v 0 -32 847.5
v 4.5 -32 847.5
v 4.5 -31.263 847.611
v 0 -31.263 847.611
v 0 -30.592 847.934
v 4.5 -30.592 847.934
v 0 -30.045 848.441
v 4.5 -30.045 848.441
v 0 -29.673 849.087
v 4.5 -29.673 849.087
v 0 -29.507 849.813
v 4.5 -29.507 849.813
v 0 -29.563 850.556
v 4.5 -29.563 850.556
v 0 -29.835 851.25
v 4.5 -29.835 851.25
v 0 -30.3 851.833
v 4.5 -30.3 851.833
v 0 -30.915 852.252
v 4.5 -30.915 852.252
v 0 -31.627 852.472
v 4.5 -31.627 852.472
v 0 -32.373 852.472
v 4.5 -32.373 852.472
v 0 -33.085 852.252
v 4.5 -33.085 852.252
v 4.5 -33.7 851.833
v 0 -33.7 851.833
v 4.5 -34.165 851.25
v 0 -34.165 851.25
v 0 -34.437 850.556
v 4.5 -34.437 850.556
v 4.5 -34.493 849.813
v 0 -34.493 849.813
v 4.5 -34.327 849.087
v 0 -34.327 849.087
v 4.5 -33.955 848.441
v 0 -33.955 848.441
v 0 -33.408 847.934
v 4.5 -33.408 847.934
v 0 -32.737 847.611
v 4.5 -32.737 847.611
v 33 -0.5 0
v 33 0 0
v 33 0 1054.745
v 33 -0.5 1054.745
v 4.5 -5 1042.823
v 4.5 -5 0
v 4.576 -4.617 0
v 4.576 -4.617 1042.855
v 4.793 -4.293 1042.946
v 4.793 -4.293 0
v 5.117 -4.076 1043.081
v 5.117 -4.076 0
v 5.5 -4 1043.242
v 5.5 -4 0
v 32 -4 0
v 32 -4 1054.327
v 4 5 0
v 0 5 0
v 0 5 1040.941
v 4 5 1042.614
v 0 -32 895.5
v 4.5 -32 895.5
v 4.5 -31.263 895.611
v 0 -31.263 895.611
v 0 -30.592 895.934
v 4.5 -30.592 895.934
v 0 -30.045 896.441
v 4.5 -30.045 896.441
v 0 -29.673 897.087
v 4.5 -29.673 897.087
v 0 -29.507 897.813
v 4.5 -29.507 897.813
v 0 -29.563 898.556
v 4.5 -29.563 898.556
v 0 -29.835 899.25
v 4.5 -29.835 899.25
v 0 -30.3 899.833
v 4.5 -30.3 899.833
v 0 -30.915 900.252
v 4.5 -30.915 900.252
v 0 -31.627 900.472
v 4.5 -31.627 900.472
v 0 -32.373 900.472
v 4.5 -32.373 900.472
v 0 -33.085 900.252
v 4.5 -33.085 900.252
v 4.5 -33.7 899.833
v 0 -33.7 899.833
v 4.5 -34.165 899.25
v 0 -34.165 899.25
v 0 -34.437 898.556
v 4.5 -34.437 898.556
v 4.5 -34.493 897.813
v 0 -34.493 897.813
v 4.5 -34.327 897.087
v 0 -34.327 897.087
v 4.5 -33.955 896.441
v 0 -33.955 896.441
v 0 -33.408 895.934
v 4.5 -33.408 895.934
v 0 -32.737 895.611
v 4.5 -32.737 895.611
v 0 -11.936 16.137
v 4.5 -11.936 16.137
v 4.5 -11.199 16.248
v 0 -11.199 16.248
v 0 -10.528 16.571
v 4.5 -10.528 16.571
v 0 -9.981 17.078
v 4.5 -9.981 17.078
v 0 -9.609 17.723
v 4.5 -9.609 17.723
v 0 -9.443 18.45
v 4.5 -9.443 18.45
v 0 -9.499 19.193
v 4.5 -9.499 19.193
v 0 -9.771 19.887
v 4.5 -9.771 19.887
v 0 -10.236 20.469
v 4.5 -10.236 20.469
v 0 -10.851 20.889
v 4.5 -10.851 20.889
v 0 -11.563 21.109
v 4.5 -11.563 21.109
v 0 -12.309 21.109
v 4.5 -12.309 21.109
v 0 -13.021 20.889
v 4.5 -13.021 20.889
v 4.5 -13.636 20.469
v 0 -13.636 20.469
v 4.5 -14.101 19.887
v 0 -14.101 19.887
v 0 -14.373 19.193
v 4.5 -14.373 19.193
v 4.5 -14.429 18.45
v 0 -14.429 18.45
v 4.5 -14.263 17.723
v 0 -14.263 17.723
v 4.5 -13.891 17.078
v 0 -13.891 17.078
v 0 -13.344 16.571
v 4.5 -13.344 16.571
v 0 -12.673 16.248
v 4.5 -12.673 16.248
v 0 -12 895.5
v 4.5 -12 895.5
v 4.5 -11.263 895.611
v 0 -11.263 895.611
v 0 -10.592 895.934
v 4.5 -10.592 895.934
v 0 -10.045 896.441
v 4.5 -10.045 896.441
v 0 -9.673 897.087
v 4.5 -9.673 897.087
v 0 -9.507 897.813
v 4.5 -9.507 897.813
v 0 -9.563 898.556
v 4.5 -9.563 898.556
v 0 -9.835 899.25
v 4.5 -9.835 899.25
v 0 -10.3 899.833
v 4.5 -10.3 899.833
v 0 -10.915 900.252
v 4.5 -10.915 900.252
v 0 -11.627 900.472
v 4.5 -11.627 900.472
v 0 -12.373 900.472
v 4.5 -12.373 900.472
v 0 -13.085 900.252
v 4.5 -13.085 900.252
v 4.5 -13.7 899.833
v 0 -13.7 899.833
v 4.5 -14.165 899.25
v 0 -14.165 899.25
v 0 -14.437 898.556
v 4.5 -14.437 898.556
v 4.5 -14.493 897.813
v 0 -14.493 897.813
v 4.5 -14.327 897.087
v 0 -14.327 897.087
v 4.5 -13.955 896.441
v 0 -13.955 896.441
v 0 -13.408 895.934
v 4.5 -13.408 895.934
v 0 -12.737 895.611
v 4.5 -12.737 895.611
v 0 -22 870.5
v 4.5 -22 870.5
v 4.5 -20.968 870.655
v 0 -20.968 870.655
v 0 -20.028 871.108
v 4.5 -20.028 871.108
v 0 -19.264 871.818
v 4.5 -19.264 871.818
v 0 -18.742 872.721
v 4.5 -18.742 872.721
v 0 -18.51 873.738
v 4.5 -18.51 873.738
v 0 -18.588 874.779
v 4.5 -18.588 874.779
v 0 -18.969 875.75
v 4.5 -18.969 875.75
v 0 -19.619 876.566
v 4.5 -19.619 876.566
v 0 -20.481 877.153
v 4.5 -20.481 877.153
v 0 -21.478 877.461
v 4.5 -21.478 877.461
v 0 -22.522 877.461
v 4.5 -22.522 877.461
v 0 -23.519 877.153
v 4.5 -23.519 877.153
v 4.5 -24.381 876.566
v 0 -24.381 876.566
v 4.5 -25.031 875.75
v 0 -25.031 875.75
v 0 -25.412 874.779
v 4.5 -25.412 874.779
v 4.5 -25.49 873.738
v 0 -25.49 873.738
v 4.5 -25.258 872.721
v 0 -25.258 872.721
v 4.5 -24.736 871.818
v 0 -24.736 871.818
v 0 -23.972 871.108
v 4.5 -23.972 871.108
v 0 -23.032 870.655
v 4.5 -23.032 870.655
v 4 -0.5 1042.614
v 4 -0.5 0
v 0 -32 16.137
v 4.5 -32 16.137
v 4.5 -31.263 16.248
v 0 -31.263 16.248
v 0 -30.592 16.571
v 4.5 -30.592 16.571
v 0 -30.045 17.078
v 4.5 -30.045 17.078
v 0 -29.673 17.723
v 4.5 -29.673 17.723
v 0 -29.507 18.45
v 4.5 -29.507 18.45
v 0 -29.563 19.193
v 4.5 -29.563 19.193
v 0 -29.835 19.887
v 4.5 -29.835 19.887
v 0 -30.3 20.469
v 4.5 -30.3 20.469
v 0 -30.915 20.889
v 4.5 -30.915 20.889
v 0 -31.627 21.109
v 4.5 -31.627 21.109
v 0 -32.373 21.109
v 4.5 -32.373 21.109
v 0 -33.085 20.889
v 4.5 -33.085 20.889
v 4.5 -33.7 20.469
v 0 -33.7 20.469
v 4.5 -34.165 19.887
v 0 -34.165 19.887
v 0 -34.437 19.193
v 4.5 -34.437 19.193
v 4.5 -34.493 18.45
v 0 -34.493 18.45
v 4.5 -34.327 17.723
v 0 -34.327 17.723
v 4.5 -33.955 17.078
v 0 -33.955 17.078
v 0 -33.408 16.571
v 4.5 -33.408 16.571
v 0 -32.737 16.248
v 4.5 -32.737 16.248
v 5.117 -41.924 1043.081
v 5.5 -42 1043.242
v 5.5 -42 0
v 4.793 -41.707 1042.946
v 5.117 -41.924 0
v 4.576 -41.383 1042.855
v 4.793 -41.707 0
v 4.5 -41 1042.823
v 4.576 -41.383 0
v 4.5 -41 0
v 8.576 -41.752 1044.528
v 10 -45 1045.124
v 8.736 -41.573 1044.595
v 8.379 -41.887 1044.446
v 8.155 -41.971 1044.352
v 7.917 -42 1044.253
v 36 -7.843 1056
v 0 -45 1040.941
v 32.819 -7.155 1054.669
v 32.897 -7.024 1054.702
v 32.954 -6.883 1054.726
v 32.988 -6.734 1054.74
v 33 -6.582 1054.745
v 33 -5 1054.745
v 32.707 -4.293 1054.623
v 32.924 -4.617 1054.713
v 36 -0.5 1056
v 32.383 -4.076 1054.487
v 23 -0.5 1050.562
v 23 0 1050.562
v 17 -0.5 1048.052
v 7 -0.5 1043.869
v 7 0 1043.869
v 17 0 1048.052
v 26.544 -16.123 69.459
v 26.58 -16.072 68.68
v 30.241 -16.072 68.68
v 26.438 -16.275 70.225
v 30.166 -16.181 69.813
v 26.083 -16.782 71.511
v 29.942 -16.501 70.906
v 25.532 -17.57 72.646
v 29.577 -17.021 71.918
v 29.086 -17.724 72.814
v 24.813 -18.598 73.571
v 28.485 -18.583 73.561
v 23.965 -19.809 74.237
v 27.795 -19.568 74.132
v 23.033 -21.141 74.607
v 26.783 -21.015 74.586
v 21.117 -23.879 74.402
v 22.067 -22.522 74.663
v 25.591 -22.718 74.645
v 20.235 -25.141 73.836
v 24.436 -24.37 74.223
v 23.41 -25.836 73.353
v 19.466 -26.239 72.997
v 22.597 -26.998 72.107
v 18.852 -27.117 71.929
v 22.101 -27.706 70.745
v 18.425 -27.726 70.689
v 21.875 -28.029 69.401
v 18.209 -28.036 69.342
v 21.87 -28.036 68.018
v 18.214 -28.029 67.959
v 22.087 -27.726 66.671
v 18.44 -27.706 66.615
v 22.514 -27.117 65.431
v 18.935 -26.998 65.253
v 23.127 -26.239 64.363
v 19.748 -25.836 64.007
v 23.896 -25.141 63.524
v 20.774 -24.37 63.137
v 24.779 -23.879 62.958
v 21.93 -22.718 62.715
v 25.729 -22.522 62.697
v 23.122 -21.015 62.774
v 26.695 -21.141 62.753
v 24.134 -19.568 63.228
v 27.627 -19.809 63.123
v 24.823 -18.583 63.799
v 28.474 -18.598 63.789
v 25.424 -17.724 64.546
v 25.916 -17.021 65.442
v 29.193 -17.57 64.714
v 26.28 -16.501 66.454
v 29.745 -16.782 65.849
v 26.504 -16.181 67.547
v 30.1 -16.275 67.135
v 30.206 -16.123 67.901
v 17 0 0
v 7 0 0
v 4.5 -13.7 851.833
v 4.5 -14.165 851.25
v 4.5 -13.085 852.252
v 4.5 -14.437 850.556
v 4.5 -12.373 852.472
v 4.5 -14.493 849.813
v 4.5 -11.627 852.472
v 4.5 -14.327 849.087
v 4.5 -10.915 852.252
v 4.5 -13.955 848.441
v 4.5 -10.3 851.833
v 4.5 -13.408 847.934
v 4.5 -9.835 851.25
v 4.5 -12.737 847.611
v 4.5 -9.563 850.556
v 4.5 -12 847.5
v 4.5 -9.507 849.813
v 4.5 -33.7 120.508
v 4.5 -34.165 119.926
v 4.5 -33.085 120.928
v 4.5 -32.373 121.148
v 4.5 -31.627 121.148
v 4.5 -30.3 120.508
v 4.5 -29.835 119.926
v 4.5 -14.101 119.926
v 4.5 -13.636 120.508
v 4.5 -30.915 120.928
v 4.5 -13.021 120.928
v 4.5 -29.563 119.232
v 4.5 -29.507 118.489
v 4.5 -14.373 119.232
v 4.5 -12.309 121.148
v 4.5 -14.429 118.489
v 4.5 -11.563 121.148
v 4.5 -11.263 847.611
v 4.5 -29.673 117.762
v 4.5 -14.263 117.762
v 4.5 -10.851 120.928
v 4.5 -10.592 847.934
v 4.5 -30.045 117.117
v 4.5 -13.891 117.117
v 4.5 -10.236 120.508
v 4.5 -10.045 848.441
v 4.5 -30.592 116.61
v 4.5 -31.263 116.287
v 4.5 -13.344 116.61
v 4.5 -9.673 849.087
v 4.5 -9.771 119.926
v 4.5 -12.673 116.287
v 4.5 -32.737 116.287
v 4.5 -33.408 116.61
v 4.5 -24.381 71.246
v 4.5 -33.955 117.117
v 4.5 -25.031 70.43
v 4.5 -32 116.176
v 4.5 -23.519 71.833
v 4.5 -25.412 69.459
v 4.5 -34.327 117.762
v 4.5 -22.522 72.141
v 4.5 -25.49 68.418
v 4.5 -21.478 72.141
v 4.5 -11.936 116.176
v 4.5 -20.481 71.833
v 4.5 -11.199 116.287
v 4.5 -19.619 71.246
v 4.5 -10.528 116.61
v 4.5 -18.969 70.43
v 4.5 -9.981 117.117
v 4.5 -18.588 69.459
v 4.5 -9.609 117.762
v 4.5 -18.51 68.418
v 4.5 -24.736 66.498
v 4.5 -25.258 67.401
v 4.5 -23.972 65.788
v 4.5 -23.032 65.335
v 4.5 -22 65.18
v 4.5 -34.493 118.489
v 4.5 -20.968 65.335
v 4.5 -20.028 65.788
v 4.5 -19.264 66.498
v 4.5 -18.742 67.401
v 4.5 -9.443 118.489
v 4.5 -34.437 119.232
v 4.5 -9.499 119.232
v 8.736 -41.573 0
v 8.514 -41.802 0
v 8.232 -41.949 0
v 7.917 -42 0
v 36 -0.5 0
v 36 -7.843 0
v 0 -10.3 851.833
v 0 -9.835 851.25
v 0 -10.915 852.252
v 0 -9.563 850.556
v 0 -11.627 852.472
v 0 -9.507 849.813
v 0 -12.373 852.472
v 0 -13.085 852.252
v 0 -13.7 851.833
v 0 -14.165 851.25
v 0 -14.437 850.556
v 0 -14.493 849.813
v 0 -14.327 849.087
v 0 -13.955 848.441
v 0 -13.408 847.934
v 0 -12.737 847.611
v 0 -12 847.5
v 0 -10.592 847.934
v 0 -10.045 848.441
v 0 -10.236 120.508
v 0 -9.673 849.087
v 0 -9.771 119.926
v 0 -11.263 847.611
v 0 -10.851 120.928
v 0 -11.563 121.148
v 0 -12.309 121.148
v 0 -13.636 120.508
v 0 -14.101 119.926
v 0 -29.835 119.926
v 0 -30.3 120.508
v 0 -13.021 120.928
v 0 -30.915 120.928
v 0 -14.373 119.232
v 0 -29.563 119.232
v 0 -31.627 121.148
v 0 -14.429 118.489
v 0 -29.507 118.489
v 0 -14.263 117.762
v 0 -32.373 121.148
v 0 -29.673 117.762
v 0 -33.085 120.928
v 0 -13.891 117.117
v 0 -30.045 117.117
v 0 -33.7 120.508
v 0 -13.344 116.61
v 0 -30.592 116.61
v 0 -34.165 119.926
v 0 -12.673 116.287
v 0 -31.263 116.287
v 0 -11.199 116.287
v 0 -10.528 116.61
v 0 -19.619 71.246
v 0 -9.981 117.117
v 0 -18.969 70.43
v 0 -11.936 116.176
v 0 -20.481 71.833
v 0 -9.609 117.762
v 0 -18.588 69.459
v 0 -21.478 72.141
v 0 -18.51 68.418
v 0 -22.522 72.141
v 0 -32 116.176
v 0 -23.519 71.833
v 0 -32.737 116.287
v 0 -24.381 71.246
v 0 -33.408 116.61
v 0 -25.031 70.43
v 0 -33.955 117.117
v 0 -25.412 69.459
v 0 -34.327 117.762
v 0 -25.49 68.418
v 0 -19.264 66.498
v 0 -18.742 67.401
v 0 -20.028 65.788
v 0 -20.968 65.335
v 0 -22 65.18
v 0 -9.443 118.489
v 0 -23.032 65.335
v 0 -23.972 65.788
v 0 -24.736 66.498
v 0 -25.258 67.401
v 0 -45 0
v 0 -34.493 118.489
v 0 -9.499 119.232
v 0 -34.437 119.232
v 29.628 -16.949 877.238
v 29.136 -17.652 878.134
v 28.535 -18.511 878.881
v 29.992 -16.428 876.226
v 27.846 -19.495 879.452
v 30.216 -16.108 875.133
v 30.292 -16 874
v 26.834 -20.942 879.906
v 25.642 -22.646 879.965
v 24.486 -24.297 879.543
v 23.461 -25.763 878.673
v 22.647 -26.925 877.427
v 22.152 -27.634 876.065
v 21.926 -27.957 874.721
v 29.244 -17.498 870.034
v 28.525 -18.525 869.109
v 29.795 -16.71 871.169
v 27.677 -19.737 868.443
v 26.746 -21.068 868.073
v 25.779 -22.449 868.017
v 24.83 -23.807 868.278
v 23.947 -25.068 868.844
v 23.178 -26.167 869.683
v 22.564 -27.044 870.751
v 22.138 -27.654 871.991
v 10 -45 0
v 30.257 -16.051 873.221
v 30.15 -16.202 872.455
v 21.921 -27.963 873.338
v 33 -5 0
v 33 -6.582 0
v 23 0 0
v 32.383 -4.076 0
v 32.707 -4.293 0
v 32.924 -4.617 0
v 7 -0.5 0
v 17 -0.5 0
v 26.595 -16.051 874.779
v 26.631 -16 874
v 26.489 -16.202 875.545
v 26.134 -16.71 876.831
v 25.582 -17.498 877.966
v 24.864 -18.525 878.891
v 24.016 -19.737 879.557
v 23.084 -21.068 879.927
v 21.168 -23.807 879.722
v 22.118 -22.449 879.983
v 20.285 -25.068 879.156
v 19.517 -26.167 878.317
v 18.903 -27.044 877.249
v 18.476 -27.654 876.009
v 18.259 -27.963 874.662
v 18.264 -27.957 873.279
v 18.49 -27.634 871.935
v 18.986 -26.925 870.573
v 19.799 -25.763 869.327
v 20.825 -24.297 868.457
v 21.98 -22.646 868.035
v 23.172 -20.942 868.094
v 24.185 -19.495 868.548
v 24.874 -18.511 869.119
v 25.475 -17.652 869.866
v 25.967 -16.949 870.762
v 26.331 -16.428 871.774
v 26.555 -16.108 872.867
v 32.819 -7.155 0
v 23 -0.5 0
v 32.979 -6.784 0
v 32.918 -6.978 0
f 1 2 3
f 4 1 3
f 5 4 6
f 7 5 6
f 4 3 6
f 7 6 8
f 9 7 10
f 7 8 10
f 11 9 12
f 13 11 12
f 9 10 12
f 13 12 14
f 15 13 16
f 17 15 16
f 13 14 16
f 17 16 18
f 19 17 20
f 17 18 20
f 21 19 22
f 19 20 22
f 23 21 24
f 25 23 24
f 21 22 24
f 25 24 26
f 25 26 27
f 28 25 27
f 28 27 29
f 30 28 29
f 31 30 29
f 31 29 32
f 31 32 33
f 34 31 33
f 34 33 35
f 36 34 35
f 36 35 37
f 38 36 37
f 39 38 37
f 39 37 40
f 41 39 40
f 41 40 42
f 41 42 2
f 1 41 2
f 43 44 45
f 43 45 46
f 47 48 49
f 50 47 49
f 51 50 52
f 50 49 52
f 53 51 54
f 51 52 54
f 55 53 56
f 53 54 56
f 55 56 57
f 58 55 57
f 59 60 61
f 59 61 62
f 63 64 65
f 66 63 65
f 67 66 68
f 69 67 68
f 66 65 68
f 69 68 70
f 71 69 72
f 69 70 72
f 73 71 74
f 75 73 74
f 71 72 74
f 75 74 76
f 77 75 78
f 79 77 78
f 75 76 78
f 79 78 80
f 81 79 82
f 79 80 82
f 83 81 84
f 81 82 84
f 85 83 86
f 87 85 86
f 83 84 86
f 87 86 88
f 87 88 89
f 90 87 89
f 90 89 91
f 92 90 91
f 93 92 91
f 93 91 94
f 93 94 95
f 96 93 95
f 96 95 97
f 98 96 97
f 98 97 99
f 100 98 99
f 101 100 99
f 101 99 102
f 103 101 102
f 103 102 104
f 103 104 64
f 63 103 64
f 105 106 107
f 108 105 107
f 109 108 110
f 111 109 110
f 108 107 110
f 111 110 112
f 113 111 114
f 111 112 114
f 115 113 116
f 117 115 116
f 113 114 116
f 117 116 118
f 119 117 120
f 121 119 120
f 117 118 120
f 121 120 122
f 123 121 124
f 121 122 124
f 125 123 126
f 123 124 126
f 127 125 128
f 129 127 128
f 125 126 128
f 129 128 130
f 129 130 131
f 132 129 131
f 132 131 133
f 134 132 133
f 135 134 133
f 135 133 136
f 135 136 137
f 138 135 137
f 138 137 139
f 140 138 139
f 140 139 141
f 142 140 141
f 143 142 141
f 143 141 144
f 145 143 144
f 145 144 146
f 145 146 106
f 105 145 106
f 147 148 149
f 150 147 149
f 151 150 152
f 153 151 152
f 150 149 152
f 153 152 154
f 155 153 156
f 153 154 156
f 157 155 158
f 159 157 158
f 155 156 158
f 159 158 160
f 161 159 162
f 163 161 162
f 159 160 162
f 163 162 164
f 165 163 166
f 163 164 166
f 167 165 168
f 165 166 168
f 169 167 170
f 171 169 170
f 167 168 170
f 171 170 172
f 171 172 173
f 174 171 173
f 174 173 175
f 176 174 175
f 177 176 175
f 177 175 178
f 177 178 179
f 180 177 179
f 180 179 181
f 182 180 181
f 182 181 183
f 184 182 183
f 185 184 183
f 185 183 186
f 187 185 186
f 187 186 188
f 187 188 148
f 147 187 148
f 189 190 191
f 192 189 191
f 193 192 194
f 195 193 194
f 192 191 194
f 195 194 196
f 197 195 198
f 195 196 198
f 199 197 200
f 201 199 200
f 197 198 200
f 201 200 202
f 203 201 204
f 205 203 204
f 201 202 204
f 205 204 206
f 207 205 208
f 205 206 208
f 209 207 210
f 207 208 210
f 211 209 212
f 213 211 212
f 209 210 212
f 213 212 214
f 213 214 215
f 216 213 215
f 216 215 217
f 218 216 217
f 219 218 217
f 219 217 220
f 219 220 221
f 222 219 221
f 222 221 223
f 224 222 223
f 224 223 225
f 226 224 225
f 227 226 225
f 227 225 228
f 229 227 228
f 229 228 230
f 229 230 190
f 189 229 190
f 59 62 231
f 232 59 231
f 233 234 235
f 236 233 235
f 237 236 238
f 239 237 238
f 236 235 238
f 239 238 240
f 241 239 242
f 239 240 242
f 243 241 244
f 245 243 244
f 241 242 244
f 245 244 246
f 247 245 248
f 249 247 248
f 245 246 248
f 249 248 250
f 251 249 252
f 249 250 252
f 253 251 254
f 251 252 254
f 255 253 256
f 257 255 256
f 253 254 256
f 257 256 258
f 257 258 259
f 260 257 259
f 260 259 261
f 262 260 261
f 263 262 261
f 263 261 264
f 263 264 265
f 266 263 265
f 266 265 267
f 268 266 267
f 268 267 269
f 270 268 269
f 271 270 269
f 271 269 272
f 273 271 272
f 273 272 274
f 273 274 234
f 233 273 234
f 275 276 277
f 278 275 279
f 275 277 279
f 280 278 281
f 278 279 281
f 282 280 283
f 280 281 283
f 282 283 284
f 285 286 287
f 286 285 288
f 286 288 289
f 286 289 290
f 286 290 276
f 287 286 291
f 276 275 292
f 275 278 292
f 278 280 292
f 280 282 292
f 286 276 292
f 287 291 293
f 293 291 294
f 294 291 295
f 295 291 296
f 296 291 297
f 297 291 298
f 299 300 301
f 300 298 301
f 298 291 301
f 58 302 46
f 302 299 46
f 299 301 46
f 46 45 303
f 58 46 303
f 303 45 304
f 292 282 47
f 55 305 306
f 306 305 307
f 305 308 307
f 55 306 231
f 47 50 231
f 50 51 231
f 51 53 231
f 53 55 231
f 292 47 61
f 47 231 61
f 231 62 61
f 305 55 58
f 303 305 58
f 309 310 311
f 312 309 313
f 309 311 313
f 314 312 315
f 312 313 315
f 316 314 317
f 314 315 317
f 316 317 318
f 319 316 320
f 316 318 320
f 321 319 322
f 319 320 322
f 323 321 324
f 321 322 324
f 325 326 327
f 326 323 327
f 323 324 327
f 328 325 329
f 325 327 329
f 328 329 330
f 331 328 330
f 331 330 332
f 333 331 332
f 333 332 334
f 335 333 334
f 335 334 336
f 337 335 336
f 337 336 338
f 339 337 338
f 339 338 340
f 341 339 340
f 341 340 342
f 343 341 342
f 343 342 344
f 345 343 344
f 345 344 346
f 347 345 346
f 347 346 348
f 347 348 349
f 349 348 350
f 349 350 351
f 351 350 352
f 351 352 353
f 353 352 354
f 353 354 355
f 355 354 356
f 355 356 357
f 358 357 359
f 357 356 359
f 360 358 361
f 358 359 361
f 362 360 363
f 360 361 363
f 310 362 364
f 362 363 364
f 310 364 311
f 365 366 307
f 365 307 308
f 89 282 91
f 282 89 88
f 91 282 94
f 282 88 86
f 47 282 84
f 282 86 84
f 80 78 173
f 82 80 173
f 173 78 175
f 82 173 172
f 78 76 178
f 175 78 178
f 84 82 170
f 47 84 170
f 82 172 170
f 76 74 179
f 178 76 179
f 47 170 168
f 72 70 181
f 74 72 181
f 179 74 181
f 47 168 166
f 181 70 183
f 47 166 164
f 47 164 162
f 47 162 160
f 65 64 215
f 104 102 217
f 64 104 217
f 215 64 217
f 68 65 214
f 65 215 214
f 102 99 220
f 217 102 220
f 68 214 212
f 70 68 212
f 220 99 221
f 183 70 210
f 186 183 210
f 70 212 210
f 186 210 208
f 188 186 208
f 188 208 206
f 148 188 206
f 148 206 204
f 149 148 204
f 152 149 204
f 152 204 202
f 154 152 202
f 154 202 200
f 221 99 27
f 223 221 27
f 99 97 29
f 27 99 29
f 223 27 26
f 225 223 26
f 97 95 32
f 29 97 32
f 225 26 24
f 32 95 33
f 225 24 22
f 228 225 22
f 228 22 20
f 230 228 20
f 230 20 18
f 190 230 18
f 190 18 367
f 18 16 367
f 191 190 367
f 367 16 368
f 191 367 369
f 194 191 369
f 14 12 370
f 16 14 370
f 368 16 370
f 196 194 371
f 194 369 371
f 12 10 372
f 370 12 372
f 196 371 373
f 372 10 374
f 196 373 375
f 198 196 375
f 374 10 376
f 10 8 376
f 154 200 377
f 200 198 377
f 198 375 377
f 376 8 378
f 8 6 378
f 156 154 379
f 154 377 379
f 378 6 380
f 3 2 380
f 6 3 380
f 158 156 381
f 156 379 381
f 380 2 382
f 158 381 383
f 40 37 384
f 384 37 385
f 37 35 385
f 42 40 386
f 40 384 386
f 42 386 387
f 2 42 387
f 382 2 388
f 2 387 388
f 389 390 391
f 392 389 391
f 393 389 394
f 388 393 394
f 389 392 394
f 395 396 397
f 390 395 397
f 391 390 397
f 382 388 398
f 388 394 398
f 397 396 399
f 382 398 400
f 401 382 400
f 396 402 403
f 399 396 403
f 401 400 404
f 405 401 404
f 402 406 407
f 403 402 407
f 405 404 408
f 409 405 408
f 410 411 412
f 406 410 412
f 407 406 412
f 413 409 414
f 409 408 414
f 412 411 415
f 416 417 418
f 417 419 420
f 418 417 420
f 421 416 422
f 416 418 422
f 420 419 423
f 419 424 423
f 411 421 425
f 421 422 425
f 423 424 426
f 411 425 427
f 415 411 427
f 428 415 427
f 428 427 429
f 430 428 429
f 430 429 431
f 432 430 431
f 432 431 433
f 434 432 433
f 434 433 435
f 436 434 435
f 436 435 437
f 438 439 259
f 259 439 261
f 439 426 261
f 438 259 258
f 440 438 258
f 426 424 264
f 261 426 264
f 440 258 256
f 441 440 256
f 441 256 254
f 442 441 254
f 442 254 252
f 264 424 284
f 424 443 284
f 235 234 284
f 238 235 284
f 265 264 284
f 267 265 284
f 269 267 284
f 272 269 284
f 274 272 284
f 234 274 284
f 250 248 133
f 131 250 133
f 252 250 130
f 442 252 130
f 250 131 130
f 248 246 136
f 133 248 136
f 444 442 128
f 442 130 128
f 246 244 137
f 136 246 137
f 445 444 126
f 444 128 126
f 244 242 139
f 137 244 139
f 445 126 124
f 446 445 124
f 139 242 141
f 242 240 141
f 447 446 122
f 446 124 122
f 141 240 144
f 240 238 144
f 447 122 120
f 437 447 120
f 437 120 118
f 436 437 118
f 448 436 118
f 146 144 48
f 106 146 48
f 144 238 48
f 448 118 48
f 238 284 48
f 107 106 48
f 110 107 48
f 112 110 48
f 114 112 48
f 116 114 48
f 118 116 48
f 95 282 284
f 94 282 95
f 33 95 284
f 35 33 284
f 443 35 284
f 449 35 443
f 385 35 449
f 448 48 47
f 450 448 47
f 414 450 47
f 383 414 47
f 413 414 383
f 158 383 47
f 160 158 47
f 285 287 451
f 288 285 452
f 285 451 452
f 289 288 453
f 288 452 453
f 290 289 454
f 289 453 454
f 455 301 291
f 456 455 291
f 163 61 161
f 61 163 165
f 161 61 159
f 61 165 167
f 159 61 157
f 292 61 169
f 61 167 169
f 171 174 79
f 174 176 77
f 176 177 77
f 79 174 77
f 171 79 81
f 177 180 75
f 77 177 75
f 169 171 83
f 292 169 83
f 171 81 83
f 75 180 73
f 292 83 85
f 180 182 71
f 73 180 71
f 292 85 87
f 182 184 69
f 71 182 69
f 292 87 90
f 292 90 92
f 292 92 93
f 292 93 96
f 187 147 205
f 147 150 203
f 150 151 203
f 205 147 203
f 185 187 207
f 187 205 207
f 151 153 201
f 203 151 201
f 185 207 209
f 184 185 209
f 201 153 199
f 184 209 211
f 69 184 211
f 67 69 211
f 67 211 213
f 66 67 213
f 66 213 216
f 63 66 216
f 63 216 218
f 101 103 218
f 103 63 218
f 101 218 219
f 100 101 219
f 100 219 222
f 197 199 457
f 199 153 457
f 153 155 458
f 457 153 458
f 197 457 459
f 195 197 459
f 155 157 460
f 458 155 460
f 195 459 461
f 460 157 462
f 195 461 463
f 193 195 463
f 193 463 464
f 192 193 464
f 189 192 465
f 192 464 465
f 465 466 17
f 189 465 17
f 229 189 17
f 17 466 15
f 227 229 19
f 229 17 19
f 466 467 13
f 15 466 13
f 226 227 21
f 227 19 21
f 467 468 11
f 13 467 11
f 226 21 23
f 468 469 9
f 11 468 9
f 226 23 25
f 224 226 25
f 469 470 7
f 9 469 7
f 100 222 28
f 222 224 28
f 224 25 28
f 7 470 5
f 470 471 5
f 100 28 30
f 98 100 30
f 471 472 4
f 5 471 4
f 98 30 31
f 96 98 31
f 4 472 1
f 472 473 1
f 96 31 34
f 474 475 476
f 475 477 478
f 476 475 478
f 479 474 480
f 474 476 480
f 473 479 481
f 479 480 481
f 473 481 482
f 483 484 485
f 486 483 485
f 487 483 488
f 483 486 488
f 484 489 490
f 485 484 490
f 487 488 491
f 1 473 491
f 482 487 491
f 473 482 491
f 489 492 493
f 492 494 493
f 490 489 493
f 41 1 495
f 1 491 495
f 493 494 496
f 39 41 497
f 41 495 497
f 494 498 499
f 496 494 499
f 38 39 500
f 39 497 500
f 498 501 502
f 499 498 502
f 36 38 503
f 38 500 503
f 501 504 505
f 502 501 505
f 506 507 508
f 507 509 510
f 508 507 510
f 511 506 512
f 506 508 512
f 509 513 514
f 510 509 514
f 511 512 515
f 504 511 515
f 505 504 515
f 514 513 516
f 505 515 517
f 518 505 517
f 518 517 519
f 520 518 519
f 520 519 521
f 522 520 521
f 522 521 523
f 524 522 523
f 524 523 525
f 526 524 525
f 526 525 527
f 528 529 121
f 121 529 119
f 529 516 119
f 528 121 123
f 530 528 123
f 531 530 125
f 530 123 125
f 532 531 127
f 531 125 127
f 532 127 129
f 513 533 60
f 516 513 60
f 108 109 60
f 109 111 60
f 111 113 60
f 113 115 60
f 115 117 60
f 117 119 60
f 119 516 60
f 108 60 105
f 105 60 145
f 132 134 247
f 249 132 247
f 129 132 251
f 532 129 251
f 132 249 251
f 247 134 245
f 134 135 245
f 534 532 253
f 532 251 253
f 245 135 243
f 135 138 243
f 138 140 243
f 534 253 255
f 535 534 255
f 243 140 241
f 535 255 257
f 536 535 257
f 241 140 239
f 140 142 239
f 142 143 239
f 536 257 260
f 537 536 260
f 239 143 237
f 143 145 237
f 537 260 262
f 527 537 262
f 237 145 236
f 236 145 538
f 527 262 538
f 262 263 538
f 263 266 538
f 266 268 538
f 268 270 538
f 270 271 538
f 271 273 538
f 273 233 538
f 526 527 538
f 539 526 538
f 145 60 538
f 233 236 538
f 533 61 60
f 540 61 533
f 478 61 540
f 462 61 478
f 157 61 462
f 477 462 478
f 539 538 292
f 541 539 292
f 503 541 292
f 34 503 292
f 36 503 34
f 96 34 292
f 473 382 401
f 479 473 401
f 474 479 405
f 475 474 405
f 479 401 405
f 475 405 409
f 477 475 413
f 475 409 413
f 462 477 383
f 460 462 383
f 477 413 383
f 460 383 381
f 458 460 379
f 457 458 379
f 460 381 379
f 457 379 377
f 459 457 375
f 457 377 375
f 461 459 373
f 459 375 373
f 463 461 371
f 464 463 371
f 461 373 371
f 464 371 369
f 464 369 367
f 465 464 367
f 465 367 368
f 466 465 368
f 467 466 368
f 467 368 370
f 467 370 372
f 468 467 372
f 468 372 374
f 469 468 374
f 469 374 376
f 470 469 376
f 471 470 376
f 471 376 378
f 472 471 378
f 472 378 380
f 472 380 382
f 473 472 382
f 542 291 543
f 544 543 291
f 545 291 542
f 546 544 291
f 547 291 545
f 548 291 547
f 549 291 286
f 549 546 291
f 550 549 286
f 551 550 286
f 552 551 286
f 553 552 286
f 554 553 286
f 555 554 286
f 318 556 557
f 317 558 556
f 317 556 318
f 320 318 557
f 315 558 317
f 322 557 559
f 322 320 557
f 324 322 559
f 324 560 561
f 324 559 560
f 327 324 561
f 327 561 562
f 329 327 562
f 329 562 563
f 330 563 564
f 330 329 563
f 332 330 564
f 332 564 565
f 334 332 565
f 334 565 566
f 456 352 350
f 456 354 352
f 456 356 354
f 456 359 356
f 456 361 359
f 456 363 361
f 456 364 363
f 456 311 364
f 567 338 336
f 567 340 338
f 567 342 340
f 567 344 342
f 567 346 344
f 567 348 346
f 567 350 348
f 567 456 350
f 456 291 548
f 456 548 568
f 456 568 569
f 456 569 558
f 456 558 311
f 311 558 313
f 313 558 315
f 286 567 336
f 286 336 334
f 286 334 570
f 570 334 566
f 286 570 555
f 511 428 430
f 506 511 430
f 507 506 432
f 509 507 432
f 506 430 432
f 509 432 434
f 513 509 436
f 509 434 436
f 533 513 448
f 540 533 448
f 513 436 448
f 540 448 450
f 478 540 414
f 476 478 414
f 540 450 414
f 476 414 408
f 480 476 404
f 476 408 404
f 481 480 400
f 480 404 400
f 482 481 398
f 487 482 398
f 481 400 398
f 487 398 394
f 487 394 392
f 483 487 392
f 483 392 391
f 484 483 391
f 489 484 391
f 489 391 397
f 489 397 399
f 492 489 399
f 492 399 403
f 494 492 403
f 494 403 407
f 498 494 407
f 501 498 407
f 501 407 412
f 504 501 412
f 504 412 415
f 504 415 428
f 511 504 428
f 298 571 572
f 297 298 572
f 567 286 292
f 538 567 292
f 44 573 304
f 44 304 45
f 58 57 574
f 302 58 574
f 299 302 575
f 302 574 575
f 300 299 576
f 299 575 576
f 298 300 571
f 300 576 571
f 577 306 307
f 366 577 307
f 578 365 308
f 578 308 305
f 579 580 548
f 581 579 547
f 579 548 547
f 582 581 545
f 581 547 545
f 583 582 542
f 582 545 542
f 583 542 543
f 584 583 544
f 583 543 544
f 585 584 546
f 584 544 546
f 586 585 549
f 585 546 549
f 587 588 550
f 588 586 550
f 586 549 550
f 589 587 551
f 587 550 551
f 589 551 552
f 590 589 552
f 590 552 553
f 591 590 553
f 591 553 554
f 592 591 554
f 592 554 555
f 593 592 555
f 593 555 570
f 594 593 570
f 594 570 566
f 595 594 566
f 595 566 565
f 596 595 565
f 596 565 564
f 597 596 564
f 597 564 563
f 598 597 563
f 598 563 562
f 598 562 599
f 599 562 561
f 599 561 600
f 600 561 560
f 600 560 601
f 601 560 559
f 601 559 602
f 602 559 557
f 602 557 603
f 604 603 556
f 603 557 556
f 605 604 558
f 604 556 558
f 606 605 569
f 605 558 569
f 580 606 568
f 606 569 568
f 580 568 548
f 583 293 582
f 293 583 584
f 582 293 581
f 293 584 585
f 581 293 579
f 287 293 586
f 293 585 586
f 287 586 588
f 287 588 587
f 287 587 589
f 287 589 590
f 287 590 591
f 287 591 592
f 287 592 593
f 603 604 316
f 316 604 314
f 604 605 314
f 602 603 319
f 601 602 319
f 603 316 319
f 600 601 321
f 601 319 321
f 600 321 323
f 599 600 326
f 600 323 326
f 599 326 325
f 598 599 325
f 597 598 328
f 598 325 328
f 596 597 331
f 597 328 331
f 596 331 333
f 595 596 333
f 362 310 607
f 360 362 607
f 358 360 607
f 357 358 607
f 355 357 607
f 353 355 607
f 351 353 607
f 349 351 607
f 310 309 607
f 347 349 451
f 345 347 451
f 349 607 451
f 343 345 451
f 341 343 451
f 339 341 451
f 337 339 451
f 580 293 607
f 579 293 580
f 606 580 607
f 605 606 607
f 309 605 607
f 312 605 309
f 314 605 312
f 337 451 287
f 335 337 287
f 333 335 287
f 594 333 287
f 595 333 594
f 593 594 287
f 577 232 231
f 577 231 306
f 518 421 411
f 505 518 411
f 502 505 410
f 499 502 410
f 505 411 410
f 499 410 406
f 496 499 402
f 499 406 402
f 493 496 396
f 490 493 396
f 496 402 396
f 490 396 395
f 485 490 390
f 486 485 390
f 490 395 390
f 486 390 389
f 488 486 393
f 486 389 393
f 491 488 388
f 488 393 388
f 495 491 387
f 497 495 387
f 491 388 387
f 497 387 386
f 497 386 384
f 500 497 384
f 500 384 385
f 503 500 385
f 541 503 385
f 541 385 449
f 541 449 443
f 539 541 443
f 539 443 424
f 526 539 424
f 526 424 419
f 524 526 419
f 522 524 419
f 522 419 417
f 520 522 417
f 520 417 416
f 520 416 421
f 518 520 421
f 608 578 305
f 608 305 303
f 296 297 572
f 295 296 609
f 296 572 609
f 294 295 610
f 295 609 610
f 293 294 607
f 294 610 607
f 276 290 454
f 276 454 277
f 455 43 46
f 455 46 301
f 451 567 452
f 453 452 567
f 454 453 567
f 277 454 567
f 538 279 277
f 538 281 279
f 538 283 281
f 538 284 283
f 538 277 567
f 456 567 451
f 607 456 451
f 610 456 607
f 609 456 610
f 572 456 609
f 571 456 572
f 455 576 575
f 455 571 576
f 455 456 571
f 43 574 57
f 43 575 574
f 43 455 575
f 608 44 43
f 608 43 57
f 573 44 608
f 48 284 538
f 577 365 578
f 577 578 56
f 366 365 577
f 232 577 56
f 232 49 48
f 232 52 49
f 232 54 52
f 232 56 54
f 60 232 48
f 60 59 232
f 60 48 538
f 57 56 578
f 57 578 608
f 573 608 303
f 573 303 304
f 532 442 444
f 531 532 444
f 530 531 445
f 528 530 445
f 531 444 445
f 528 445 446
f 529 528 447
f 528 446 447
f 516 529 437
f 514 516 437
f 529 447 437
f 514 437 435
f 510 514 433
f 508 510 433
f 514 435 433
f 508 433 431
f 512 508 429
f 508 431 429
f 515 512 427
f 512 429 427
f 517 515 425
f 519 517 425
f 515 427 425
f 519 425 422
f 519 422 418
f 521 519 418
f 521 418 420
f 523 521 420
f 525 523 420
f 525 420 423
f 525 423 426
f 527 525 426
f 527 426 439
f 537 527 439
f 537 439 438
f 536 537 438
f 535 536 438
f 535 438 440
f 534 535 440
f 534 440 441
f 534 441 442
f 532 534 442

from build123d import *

# Parameters (mm, degrees)
EXTRUDE_1_DEPTH        = 1056
HOLE_WIZARD_7_0_7_1_D  = 7
CUT_EXTRUDE_2_REACH    = 1059.571
SKETCH_5_R             = 6
HOLE_WIZARD_M5_1_D     = 5
HOLE_WIZARD_M5_1_DEPTH = 4.5
HOLE_WIZARD_M5_2_D     = 5
HOLE_WIZARD_M5_2_DEPTH = 4.5
CUT_EXTRUDE_3_DEPTH    = 1058.795821508


with BuildPart() as part:
    # 草图1 → 凸台-拉伸1 (new body)
    with BuildSketch(Plane.XY):
        Polygon((36, -0.5), (36, -7.842615501), (10, -45), (0, -45), (0, 0), (0, 5), (4, 5), (4, -0.5), (7, -0.5), (7, 0), (17, 0), (17, -0.5), (23, -0.5), (23, 0), (33, 0), (33, -0.5), align=None)
        with BuildLine():
            Line((33, -5), (33, -6.582130473))
            ThreePointArc((33, -6.582130473), (32.953765498, -6.882682255), (32.819337252, -7.155442314))
            Line((32.819337252, -7.155442314), (8.736247988, -41.573311842))
            ThreePointArc((8.736247988, -41.573311842), (8.378802584, -41.886936255), (7.916910736, -42))
            Line((7.916910736, -42), (5.5, -42))
            ThreePointArc((5.5, -42), (4.792893219, -41.707106781), (4.5, -41))
            Line((4.5, -41), (4.5, -5))
            ThreePointArc((4.5, -5), (4.792893219, -4.292893219), (5.5, -4))
            Line((5.5, -4), (32, -4))
            ThreePointArc((32, -4), (32.707106781, -4.292893219), (33, -5))
        make_face(mode=Mode.SUBTRACT)
    extrude(amount=EXTRUDE_1_DEPTH)

    # Ø7.0 (7) 直径孔1 (through all)
    with Locations(Plane.ZY):
        with Locations((68.68, -22), (874, -22)):
            Hole(HOLE_WIZARD_7_0_7_1_D / 2)

    # 切除-拉伸2: up to this plane
    cut_extrude_2_end = Plane(origin=(32.819337252, -7.155442314, 1056), z_dir=(-0.8193372517042258, 0.5733118418188885, 0))
    # 草图5 → 切除-拉伸2 (cut, up to the surface)
    with BuildSketch(Plane(origin=(36, 0, 0), x_dir=(0, 0, -1), z_dir=(1, 0, 0)), mode=Mode.PRIVATE) as cut_extrude_2_sk1:
        with Locations(Location((-68.68, -22.072492254, 0), (0, 0, 90))):
            Circle(SKETCH_5_R)
    cut_extrude_2_tool1 = split(extrude(cut_extrude_2_sk1.sketch, amount=-CUT_EXTRUDE_2_REACH, mode=Mode.PRIVATE), bisect_by=cut_extrude_2_end, keep=Keep.BOTH, mode=Mode.PRIVATE)
    add(cut_extrude_2_tool1.solids().sort_by_distance((36, -22.072492, 68.68))[0], mode=Mode.SUBTRACT)
    # 草图5 → 切除-拉伸2 (cut, up to the surface)
    with BuildSketch(Plane(origin=(36, 0, 0), x_dir=(0, 0, -1), z_dir=(1, 0, 0)), mode=Mode.PRIVATE) as cut_extrude_2_sk2:
        with Locations(Location((-874, -22, 0), (0, 0, 90))):
            Circle(SKETCH_5_R)
    cut_extrude_2_tool2 = split(extrude(cut_extrude_2_sk2.sketch, amount=-CUT_EXTRUDE_2_REACH, mode=Mode.PRIVATE), bisect_by=cut_extrude_2_end, keep=Keep.BOTH, mode=Mode.PRIVATE)
    add(cut_extrude_2_tool2.solids().sort_by_distance((36, -22, 874))[0], mode=Mode.SUBTRACT)

    # M5 螺纹孔1
    with Locations(Plane.ZY):
        with Locations((18.636598419, -11.935996902), (18.636598419, -32), (118.675555099, -11.935996902), (118.675555099, -32)):
            Hole(HOLE_WIZARD_M5_1_D / 2, depth=HOLE_WIZARD_M5_1_DEPTH)

    # M5 螺纹孔2
    with Locations(Plane.ZY):
        with Locations((850, -12), (898, -12), (898, -32), (850, -32)):
            Hole(HOLE_WIZARD_M5_2_D / 2, depth=HOLE_WIZARD_M5_2_DEPTH)

    # 草图11 → 切除-拉伸3 (cut, through all)
    with BuildSketch(Plane(origin=(0, 5, 0), x_dir=(1, 0, 0), z_dir=(0, 1, 0))):
        Polygon((36, -1056), (0, -1040.940873789), (0, -1056), align=None)
    extrude(amount=-CUT_EXTRUDE_3_DEPTH, mode=Mode.SUBTRACT)


solid = part.part
